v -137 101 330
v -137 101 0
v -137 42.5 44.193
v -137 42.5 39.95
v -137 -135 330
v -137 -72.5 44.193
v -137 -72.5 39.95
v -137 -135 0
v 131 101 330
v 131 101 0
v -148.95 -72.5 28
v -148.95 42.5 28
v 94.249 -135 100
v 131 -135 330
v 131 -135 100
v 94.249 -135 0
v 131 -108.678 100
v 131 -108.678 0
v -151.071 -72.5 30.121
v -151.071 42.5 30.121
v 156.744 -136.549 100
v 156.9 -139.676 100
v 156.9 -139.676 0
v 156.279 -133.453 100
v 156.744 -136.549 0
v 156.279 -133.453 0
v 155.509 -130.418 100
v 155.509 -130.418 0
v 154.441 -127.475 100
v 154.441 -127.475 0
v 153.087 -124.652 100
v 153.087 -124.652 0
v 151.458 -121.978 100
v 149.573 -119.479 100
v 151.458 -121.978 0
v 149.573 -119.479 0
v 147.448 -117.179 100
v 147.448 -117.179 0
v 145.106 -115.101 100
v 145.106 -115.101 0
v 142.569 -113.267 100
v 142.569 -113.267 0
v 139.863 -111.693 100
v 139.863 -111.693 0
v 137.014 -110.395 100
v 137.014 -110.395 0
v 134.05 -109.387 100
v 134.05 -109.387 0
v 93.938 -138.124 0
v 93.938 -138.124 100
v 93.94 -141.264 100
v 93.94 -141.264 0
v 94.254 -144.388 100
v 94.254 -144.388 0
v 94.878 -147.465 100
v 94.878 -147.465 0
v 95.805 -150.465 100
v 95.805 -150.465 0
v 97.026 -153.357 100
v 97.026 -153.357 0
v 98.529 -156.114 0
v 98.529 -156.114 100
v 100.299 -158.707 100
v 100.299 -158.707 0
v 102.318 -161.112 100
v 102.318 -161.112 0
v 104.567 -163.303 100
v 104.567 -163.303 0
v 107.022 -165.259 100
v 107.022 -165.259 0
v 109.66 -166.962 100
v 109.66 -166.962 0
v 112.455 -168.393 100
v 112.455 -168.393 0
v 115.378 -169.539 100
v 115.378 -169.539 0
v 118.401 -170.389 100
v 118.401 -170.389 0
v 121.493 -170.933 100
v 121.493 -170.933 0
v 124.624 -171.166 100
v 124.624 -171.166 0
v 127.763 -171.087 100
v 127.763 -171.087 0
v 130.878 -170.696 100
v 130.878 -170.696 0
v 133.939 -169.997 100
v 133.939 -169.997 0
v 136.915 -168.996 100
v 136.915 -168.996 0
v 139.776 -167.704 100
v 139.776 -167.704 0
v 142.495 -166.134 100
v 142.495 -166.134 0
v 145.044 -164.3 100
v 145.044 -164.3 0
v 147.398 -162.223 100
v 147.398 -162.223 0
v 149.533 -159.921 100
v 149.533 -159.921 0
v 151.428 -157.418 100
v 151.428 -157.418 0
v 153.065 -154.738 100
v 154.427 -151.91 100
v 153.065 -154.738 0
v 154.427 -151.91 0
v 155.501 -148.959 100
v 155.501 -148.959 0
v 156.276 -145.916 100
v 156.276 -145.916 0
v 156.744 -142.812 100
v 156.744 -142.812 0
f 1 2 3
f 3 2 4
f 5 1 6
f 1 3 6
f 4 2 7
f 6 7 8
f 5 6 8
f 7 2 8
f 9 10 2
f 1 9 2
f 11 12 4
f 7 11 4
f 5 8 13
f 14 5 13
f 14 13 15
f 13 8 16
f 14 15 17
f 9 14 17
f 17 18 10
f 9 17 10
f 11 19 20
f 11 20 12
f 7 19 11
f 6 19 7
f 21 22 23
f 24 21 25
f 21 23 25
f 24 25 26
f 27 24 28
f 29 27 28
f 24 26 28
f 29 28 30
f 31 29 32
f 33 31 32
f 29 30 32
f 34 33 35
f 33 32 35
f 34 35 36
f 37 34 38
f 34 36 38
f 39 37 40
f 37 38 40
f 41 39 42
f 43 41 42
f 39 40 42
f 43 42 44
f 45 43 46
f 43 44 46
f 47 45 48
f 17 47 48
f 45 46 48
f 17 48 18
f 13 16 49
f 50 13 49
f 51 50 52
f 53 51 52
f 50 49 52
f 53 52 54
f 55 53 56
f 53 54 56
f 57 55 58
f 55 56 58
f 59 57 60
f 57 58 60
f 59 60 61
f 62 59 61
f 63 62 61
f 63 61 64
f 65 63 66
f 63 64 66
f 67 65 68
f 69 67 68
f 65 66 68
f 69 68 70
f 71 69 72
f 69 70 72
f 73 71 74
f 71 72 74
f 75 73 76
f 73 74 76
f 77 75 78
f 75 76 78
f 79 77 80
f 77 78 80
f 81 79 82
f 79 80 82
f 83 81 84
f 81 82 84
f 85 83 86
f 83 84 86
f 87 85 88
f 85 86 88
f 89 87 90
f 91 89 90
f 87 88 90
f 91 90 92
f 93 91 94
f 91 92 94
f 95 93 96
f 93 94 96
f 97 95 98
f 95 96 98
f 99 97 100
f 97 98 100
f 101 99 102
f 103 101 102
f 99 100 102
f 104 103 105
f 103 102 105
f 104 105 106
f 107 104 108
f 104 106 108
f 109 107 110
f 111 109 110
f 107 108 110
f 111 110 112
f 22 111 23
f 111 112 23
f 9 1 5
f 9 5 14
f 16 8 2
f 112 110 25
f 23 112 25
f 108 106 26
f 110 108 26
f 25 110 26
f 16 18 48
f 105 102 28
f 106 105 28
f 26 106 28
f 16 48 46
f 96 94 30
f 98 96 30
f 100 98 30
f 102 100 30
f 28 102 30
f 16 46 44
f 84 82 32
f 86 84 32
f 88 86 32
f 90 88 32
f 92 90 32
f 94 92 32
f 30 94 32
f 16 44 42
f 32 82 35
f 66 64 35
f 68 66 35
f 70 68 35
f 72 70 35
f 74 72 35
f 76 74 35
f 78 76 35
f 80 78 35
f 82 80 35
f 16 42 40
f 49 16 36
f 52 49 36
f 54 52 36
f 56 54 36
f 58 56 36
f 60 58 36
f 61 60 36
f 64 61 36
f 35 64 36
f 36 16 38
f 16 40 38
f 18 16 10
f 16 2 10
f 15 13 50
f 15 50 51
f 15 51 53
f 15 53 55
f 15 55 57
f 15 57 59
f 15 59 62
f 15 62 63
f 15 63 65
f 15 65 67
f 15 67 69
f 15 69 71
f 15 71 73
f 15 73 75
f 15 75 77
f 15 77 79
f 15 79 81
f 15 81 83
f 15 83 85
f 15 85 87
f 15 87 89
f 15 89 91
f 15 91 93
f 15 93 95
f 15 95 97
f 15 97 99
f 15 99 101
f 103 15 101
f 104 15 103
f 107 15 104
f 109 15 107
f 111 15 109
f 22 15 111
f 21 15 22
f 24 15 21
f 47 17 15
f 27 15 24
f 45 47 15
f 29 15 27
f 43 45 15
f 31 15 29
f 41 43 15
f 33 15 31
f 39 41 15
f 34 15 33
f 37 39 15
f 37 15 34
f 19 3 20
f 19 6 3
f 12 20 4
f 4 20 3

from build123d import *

# Parameters (mm, degrees)
F1_DEPTH      = 330
F2_DEPTH      = 100
F4_DEPTH      = 72.5
F4_DEPTH_BACK = 42.5


with BuildPart() as f1:
    # F0 (on Top) → F1 (new body)
    with BuildSketch(Plane.XY):
        with BuildLine():
            Line((-137, 101), (-137, -135))
            Line((-137, -135), (94.248996, -135))
            ThreePointArc((94.248996, -135), (107.058017, -114.066985), (131, -108.677774))
            Line((131, -108.677774), (131, 101))
            Line((131, 101), (-137, 101))
        make_face()
        with BuildLine():
            ThreePointArc((131, -108.677774), (107.058017, -114.066985), (94.248996, -135))
            Line((94.248996, -135), (131, -135))
            Line((131, -135), (131, -108.677774))
        make_face()
    extrude(amount=F1_DEPTH)

    # F0 (on Top) → F2 (join)
    with BuildSketch(Plane.XY):
        with BuildLine():
            Line((131, -135), (94.248996, -135))
            ThreePointArc((94.248996, -135), (123.055497, -171.08863), (156.9, -139.676))
            ThreePointArc((156.9, -139.676), (149.572815, -119.478847), (131, -108.677774))
            Line((131, -108.677774), (131, -135))
        make_face()
    extrude(amount=F2_DEPTH)

    # F3 (on Front) → F4 (join, two sides)
    with BuildSketch(Plane.XZ) as f4_sk:
        Polygon((-137, 44.192641), (-151.07132, 30.12132), (-148.95, 28), (-134.87868, 42.07132), align=None)
    extrude(amount=F4_DEPTH)
    extrude(f4_sk.sketch, amount=-F4_DEPTH_BACK)


solid = f1.part
